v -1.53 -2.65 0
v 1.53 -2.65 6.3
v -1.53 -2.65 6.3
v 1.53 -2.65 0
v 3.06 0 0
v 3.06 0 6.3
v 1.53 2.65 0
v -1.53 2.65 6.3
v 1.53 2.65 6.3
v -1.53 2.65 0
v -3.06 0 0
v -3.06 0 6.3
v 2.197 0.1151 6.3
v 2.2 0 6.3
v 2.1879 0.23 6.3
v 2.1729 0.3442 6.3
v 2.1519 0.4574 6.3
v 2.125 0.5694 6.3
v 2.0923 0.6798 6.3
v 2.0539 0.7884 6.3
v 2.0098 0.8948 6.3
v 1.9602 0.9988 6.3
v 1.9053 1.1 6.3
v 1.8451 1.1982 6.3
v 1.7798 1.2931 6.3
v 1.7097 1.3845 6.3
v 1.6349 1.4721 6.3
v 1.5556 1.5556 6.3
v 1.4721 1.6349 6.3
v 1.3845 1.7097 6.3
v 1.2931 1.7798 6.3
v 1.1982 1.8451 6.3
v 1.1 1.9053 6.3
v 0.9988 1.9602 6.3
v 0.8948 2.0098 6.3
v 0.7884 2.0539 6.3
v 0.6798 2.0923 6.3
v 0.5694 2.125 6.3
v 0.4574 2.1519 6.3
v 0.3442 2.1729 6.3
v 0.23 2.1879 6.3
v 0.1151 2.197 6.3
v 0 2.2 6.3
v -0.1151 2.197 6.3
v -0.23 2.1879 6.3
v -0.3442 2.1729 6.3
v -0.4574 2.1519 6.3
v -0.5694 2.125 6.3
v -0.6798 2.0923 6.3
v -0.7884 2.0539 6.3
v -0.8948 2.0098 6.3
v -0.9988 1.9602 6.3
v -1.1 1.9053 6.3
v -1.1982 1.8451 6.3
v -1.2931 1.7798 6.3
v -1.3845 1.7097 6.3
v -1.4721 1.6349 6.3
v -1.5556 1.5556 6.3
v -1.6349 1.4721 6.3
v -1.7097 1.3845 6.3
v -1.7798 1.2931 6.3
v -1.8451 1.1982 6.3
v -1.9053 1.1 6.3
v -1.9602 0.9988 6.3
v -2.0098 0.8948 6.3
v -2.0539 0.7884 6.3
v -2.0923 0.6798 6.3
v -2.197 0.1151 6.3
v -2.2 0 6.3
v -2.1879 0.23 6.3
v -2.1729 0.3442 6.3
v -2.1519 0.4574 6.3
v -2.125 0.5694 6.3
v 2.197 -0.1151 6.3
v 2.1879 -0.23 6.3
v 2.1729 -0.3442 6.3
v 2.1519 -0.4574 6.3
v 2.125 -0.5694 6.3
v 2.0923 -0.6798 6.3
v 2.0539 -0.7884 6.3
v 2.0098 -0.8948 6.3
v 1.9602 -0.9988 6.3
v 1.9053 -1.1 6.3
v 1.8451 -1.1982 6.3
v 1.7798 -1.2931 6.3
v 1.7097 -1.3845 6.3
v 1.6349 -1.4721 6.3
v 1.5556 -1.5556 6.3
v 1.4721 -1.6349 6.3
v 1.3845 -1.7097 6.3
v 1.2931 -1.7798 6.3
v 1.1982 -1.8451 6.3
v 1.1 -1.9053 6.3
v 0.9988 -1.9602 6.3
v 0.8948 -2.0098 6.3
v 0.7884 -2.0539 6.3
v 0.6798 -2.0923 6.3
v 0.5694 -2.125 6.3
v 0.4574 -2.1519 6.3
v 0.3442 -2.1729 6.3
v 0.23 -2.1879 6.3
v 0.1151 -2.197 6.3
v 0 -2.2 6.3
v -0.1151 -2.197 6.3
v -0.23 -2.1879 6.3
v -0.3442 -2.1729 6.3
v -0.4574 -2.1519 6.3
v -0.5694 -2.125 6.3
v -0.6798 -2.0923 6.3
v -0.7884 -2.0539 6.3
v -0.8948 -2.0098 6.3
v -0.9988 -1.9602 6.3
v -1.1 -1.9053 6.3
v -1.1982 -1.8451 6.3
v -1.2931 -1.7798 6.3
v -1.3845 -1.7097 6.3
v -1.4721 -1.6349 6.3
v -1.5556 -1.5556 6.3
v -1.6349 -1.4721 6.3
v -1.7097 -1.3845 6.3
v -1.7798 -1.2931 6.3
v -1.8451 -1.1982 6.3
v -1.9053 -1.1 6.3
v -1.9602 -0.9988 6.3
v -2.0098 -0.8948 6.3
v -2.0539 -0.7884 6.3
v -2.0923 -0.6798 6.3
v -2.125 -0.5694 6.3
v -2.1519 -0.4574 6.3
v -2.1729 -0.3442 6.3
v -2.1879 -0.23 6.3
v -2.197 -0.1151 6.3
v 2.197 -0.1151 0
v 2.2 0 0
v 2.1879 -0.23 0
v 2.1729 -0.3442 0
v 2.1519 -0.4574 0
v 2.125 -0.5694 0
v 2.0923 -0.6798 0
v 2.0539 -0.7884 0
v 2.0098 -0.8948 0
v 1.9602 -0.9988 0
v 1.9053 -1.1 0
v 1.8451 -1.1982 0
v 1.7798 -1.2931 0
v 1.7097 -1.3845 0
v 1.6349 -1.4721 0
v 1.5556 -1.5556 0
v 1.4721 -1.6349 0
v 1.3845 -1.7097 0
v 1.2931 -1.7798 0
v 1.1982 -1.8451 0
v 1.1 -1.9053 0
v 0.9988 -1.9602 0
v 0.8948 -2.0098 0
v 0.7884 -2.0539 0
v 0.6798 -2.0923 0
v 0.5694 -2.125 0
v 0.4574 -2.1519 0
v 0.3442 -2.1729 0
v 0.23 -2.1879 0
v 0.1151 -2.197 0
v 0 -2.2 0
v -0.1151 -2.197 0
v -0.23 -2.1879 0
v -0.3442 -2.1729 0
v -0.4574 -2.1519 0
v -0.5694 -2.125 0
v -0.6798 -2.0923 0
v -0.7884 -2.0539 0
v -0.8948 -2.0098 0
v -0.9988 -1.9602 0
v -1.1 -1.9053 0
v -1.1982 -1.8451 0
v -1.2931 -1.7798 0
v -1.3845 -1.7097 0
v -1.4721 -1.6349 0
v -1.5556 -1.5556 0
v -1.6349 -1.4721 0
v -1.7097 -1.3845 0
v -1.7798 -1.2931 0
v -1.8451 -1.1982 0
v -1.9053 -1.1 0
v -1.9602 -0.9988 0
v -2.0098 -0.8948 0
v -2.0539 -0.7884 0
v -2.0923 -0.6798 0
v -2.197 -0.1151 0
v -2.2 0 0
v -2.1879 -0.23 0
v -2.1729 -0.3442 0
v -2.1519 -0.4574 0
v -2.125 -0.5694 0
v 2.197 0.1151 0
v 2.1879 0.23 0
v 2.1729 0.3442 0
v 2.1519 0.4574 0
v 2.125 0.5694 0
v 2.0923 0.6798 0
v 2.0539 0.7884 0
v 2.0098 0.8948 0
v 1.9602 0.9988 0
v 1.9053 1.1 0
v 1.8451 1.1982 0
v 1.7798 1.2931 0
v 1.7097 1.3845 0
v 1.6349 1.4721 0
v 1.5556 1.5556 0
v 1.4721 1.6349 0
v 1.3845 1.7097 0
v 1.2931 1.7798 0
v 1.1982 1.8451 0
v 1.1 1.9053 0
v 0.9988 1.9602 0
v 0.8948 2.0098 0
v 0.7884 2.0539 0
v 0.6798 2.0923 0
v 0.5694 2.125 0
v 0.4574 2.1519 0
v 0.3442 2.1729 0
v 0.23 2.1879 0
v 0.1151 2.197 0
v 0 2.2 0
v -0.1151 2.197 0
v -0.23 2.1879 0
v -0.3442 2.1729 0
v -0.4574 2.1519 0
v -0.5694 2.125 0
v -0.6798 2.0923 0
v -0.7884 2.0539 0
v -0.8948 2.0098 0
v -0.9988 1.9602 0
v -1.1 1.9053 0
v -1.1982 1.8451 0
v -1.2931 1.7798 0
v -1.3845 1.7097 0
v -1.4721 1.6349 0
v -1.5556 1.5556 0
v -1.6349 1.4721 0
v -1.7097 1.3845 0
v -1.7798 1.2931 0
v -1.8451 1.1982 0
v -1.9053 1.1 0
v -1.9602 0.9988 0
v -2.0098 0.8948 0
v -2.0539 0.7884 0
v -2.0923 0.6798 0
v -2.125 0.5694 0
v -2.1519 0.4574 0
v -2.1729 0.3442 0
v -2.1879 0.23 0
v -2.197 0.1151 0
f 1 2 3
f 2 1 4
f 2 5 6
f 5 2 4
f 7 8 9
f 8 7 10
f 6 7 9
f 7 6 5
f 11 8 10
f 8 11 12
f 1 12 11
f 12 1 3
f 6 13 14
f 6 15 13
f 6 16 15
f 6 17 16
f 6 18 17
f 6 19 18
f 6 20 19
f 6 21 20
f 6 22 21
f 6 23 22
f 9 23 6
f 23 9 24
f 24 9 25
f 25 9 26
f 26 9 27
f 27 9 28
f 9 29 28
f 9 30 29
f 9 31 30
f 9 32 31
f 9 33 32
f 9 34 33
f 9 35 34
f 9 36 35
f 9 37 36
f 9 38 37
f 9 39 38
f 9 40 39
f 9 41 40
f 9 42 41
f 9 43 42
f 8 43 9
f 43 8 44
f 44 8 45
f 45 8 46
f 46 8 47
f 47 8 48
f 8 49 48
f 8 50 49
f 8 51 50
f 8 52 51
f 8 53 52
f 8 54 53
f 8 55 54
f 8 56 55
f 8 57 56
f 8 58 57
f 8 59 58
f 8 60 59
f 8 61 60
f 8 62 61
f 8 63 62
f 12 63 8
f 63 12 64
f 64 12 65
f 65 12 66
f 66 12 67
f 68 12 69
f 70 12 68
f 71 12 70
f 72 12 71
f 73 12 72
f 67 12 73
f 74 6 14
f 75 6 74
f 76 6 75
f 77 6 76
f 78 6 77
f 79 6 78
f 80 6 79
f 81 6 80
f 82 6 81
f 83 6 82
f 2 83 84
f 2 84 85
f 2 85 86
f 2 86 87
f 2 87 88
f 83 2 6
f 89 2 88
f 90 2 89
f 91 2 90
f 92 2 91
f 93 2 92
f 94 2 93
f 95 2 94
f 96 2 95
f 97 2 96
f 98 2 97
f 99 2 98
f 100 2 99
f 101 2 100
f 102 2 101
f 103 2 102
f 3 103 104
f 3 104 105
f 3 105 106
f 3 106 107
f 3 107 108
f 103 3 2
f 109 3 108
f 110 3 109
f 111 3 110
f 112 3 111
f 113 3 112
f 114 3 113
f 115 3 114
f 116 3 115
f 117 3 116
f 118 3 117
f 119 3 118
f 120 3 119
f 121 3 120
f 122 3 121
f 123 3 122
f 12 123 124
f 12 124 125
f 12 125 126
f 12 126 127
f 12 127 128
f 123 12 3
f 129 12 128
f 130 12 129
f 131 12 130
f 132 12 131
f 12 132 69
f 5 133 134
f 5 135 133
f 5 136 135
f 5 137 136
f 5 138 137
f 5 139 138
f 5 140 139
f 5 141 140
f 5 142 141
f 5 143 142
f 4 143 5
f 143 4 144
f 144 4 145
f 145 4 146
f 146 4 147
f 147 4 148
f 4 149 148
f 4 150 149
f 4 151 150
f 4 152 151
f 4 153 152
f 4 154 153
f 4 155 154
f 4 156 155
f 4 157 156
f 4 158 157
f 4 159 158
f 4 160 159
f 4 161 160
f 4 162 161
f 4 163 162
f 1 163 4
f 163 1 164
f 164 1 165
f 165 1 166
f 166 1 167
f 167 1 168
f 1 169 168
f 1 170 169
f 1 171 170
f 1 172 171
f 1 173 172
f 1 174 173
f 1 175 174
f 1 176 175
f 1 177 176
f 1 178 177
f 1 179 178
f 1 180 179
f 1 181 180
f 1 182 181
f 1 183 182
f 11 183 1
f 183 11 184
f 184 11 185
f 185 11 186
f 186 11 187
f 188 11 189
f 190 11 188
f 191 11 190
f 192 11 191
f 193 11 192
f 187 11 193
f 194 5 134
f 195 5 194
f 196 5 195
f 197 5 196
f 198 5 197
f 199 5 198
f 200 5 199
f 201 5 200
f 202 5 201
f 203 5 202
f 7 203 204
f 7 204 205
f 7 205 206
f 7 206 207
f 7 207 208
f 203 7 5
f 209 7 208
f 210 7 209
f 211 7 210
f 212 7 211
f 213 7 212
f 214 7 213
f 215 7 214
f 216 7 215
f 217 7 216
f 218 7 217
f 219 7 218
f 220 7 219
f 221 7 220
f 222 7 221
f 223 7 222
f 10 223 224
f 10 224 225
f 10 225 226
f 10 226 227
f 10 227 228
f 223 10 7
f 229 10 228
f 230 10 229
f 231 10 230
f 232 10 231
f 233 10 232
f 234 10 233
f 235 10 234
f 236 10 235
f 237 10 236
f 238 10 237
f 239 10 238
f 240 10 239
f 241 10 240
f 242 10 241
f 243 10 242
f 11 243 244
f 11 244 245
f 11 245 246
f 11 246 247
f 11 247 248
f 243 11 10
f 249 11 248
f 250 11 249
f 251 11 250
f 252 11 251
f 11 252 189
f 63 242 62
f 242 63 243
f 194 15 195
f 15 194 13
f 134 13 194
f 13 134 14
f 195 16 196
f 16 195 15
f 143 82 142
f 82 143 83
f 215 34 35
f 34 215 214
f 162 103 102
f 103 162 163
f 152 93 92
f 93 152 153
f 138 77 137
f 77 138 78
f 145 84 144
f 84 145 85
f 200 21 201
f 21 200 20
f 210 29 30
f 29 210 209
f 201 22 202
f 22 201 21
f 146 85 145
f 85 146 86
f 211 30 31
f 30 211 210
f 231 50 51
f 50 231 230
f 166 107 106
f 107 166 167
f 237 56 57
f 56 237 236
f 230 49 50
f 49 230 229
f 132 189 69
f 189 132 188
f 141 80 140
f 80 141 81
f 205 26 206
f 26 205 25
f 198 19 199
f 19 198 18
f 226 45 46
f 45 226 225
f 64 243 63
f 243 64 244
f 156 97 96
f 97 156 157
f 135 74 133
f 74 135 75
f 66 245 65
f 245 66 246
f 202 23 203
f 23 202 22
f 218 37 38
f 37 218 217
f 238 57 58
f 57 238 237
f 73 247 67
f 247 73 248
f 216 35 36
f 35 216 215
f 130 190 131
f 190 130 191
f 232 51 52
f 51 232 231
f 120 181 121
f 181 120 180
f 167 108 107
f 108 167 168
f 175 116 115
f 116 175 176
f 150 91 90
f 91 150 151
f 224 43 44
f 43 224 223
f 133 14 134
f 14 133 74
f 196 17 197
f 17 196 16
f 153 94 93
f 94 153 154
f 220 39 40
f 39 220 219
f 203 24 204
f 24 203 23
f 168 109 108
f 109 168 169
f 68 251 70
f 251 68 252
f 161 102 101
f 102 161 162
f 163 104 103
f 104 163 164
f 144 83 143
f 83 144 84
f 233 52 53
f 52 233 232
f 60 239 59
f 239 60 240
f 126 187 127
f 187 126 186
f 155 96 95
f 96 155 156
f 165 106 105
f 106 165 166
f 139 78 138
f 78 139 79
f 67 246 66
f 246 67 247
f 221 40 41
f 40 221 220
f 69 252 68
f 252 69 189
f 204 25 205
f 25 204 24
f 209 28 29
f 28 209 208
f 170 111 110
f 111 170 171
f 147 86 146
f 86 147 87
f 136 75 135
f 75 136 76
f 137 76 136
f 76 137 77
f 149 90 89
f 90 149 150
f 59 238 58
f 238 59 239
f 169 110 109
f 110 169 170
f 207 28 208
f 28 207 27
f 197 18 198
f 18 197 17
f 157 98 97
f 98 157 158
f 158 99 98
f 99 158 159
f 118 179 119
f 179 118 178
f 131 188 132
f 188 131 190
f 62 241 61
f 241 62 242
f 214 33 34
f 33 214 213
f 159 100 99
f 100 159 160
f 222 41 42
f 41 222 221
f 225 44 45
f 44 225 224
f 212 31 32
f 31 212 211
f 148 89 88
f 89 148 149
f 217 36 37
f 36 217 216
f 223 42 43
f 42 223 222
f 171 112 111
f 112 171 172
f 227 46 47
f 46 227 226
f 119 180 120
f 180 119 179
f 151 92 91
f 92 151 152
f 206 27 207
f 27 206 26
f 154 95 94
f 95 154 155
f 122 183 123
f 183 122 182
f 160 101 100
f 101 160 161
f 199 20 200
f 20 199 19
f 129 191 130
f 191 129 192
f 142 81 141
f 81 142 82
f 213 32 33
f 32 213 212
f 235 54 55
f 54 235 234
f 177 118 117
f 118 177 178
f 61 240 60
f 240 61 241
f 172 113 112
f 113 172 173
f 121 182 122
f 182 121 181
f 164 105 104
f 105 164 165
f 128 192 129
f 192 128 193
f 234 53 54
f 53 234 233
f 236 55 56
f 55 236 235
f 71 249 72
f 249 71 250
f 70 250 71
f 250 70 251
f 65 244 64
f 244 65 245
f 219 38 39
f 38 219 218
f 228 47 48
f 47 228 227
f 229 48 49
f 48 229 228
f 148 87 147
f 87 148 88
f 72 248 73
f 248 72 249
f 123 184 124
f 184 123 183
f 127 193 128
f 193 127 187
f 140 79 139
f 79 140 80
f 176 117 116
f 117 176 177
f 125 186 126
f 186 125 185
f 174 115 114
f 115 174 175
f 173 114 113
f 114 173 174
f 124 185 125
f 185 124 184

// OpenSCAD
$fn = 120;

screw_d = 4.0;          // clearance for 4.0mm screw
across_flats = 5.3;     // mm
thickness = 6.3;        // mm

hole_d = screw_d + 0.4; // typical clearance
eps = 0.02;

module hex_prism(af, h){
    // For a regular hexagon: across_flats = 2 * apothem
    // circumradius R = apothem / cos(30°) = (af/2)/cos(30°)
    R = (af/2) / cos(30);
    cylinder(h=h, r=R, $fn=6);
}

difference() {
    hex_prism(across_flats, thickness);
    translate([0,0,-eps])
        cylinder(h=thickness + 2*eps, d=hole_d, $fn=120);
}
